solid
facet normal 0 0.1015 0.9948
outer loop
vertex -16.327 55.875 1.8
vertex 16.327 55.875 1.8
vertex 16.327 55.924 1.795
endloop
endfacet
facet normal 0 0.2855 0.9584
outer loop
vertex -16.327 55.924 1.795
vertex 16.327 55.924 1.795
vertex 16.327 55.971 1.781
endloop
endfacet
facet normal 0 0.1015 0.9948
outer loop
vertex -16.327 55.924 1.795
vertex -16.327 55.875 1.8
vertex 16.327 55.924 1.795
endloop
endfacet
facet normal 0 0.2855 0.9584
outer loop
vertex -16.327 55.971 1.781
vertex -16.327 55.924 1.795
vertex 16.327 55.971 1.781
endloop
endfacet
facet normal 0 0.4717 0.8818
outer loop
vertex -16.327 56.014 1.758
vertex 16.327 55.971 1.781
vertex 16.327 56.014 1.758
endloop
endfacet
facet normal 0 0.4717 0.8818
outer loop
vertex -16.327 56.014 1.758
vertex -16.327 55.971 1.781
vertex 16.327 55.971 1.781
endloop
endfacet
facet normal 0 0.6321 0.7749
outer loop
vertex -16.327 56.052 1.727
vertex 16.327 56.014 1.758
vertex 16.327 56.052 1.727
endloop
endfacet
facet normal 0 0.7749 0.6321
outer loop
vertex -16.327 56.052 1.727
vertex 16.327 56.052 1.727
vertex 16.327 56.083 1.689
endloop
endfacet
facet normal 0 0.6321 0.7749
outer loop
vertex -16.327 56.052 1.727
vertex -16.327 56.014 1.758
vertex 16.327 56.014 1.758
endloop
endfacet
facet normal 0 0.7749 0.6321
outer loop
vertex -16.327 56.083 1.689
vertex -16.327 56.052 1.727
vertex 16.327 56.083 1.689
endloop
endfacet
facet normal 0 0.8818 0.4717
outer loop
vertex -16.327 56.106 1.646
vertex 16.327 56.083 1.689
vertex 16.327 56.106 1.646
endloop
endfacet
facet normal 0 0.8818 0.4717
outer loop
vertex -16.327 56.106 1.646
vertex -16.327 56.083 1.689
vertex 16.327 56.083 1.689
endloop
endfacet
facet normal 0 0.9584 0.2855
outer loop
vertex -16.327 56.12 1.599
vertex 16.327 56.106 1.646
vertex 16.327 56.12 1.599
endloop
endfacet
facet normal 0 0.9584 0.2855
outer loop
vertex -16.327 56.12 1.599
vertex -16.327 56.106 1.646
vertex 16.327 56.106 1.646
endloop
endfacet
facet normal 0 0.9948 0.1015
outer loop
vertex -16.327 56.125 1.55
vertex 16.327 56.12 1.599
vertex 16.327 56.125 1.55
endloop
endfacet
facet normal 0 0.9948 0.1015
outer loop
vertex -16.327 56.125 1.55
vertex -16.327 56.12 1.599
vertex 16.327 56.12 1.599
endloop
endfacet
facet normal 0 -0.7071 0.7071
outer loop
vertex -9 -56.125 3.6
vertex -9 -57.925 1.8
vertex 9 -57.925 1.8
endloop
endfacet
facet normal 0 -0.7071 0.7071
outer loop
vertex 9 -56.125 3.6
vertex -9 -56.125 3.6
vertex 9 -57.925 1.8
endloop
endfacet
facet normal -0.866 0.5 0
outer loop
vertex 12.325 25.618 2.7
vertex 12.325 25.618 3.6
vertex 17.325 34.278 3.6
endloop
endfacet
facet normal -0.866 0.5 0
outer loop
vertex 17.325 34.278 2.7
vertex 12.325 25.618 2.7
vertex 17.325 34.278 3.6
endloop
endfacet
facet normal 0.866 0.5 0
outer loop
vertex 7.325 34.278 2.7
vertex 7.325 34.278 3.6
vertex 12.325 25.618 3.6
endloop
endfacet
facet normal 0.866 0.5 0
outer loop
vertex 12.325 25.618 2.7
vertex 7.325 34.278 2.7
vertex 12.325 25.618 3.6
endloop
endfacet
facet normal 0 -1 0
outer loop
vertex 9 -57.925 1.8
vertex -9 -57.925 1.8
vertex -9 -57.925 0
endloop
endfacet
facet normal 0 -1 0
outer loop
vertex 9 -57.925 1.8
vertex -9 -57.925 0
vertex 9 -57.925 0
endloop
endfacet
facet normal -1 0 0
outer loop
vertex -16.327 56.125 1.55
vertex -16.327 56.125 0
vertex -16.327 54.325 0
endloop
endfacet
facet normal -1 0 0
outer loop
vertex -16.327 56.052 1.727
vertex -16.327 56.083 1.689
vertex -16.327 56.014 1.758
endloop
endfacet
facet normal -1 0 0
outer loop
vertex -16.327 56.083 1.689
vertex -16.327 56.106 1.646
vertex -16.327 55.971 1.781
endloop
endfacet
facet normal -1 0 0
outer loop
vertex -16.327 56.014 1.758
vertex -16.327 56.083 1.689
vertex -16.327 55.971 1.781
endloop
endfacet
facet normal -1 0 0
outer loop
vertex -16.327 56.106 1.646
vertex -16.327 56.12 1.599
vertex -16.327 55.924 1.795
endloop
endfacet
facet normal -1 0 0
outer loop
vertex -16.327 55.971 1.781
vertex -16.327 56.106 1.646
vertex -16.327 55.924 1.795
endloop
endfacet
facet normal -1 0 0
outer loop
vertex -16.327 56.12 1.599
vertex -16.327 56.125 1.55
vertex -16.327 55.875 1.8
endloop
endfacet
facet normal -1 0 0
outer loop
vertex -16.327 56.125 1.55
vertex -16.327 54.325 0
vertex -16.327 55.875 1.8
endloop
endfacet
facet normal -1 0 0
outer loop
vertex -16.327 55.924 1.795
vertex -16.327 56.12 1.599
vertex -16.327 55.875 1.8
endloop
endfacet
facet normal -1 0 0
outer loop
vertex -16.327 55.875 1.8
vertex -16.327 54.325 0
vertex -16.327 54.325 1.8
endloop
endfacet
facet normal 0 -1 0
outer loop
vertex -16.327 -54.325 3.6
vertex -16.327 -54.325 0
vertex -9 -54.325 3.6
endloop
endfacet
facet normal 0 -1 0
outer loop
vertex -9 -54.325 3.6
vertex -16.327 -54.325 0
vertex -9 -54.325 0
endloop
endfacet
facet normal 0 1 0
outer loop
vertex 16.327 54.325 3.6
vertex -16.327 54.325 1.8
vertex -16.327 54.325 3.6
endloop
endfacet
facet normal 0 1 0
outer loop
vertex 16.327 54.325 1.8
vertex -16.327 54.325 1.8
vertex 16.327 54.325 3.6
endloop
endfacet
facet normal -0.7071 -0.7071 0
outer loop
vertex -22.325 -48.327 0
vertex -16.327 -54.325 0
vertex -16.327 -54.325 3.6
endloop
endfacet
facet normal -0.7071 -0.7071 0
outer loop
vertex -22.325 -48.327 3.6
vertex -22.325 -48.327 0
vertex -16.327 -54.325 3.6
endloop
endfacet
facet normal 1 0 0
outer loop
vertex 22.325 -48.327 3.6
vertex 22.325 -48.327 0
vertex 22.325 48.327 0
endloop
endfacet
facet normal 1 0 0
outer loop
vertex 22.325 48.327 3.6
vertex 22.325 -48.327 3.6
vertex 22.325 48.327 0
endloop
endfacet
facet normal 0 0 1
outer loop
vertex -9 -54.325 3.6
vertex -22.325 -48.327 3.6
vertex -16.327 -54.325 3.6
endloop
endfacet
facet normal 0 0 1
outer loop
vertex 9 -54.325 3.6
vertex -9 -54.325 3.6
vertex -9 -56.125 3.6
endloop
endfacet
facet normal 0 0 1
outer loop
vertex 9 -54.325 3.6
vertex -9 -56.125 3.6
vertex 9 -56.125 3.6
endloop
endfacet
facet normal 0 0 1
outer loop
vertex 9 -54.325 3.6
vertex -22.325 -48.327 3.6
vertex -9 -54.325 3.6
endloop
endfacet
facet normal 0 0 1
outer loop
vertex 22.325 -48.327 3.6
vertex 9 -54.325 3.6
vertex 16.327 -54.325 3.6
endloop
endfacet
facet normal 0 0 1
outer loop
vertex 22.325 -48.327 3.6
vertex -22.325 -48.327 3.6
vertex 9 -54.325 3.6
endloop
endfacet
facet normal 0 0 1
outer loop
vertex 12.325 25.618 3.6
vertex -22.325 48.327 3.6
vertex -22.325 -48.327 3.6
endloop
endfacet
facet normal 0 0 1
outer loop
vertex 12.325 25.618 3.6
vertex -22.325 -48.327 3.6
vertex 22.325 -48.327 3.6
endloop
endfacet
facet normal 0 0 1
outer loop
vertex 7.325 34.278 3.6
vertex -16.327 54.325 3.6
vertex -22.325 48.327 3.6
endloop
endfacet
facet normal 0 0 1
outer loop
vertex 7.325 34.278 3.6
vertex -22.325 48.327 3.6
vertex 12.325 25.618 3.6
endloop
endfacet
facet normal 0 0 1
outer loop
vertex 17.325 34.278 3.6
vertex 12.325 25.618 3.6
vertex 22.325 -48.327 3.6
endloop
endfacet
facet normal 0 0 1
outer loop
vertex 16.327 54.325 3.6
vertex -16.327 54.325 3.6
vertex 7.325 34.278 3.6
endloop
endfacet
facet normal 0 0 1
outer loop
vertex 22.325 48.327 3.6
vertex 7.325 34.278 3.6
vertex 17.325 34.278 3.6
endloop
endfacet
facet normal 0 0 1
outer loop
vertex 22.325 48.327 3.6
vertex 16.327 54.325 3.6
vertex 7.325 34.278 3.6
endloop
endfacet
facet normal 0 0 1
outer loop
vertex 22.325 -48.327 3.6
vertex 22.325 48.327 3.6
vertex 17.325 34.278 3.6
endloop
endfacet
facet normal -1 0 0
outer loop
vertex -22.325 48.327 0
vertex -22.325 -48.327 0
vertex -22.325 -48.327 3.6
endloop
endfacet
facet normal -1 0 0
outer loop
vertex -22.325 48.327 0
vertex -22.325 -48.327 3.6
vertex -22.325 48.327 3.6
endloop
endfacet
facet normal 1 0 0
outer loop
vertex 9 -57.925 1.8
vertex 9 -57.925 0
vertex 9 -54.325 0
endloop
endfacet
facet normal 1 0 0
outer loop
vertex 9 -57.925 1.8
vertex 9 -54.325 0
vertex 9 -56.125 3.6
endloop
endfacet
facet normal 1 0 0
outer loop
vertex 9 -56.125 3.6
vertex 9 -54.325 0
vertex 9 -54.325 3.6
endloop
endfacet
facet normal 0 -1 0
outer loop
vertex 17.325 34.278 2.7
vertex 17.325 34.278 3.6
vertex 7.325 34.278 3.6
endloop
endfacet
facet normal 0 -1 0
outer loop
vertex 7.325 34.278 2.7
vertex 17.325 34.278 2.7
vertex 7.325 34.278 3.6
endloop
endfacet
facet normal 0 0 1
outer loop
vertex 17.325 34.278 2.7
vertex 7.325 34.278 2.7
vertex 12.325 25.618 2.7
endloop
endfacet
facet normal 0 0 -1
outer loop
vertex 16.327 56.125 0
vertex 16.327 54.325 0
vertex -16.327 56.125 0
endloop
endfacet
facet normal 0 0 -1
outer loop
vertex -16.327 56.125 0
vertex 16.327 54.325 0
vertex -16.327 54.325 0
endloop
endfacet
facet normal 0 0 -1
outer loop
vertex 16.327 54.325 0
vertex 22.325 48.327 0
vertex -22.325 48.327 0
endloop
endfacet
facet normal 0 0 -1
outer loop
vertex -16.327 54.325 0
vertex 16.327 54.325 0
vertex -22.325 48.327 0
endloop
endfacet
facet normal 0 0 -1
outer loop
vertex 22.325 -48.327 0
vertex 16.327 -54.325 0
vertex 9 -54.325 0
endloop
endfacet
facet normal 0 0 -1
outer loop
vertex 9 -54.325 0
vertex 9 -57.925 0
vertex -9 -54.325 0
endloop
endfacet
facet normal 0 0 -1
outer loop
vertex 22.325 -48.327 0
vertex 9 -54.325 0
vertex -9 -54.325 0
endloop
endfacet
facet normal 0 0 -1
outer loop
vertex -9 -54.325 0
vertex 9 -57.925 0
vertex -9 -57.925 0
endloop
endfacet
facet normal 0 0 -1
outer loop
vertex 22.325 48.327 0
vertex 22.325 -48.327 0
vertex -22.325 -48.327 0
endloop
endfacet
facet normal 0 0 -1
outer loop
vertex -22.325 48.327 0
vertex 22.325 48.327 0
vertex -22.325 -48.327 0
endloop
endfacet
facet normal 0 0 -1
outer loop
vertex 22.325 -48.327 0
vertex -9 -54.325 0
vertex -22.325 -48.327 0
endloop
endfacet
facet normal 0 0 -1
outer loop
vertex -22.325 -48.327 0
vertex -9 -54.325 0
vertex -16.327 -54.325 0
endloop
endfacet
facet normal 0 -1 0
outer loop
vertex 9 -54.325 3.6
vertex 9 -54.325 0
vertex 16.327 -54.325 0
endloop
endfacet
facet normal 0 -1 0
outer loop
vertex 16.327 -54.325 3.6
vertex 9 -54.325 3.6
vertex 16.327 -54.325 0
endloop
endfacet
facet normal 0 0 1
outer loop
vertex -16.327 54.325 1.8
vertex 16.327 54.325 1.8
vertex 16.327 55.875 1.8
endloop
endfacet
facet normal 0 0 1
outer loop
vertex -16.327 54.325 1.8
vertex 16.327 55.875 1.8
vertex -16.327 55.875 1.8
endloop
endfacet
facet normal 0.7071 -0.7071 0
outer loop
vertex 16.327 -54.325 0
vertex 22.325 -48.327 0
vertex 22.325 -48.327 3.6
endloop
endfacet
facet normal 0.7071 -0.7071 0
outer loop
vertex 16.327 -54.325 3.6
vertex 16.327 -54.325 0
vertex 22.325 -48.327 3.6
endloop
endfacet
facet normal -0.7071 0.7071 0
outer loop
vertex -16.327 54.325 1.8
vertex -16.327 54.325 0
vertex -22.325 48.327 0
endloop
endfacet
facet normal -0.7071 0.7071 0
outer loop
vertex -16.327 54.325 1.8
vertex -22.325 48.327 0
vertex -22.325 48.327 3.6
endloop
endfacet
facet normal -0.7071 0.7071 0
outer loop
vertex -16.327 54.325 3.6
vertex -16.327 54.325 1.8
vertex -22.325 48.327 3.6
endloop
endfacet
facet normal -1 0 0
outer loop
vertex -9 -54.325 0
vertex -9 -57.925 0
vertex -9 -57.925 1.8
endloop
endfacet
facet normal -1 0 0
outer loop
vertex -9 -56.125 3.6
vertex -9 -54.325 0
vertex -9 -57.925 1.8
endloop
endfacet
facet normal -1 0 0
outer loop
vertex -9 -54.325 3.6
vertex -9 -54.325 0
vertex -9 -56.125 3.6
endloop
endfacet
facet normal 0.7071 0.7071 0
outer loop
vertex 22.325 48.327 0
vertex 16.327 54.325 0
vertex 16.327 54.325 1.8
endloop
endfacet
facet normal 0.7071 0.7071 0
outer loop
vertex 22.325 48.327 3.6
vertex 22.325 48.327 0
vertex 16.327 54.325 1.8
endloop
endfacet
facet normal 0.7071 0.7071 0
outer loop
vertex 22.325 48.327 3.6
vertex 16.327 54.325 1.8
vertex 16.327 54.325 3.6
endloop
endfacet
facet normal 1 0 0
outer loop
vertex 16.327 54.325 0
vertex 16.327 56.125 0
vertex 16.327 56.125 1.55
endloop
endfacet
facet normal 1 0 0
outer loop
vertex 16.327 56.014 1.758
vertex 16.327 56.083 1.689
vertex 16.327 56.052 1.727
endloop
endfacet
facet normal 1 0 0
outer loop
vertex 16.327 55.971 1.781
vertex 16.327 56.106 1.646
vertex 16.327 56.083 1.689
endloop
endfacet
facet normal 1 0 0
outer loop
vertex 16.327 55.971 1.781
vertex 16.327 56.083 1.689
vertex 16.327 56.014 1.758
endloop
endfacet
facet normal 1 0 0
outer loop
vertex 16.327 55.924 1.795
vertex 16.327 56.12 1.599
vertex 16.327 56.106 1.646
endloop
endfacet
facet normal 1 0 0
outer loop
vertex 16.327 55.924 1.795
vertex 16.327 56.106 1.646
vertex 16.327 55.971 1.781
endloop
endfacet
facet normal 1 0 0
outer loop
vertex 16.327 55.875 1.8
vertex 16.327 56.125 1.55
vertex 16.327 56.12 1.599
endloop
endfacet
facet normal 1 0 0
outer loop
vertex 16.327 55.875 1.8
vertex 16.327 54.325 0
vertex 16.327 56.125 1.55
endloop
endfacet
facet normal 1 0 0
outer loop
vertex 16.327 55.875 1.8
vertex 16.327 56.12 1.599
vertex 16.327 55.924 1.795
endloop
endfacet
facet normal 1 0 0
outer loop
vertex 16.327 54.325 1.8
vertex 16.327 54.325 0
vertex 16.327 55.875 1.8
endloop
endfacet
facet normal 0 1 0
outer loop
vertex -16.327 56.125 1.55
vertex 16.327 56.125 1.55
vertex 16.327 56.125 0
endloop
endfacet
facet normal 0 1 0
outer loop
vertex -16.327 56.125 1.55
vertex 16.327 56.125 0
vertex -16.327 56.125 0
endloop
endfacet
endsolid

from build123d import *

# Parameters (mm, degrees)
F1_W      = 44.65
F1_H      = 108.65
F2_DEPTH  = 3.6
F3_SIZE   = 5.9976
F4_W      = 32.6548
F4_H      = 1.8
F5_DEPTH  = 1.8
F6_R      = 0.25
F7_W      = 18
F7_H      = 3.6
F8_DEPTH  = 3.6
F9_SIZE   = 1.8
F11_DEPTH = 0.9


with BuildPart() as f2:
    # F1 (on Top) → F2 (new body)
    with BuildSketch(Plane.XY):
        Rectangle(F1_W, F1_H)
    extrude(amount=F2_DEPTH)

    # F3
    f3_edges = [f2.edges().sort_by_distance(p)[0] for p in [
        (22.325, -54.325, 1.8),
        (-22.325, -54.325, 1.8),
        (-22.325, 54.325, 1.8),
        (22.325, 54.325, 1.8),
    ]]
    chamfer(f3_edges, length=F3_SIZE)

    # F4 (on face) → F5 (join)
    with BuildSketch(Plane(origin=(0, 54.325, 0), x_dir=(-1, 0, 0), z_dir=(0, 1, 0))):
        with Locations((0, 0.9)):
            Rectangle(F4_W, F4_H)
    extrude(amount=F5_DEPTH)

    # F6
    f6_edges = [f2.edges().sort_by_distance(p)[0] for p in [
        (0, 56.125, 1.8),
    ]]
    fillet(f6_edges, radius=F6_R)

    # F7 (on face) → F8 (join)
    with BuildSketch(Plane.XZ.offset(54.325)):
        with Locations((0, 1.8)):
            Rectangle(F7_W, F7_H)
    extrude(amount=F8_DEPTH)

    # F9
    f9_edges = [f2.edges().sort_by_distance(p)[0] for p in [
        (0, -57.925, 3.6),
    ]]
    chamfer(f9_edges, length=F9_SIZE)

    # F10 (on face) → F11 (cut)
    with BuildSketch(Plane.XY.offset(3.6)):
        Polygon((17.325, 34.2784180126), (7.325, 34.2784180126), (12.325, 25.6181639748), align=None)
    extrude(amount=-F11_DEPTH, mode=Mode.SUBTRACT)


solid = f2.part
